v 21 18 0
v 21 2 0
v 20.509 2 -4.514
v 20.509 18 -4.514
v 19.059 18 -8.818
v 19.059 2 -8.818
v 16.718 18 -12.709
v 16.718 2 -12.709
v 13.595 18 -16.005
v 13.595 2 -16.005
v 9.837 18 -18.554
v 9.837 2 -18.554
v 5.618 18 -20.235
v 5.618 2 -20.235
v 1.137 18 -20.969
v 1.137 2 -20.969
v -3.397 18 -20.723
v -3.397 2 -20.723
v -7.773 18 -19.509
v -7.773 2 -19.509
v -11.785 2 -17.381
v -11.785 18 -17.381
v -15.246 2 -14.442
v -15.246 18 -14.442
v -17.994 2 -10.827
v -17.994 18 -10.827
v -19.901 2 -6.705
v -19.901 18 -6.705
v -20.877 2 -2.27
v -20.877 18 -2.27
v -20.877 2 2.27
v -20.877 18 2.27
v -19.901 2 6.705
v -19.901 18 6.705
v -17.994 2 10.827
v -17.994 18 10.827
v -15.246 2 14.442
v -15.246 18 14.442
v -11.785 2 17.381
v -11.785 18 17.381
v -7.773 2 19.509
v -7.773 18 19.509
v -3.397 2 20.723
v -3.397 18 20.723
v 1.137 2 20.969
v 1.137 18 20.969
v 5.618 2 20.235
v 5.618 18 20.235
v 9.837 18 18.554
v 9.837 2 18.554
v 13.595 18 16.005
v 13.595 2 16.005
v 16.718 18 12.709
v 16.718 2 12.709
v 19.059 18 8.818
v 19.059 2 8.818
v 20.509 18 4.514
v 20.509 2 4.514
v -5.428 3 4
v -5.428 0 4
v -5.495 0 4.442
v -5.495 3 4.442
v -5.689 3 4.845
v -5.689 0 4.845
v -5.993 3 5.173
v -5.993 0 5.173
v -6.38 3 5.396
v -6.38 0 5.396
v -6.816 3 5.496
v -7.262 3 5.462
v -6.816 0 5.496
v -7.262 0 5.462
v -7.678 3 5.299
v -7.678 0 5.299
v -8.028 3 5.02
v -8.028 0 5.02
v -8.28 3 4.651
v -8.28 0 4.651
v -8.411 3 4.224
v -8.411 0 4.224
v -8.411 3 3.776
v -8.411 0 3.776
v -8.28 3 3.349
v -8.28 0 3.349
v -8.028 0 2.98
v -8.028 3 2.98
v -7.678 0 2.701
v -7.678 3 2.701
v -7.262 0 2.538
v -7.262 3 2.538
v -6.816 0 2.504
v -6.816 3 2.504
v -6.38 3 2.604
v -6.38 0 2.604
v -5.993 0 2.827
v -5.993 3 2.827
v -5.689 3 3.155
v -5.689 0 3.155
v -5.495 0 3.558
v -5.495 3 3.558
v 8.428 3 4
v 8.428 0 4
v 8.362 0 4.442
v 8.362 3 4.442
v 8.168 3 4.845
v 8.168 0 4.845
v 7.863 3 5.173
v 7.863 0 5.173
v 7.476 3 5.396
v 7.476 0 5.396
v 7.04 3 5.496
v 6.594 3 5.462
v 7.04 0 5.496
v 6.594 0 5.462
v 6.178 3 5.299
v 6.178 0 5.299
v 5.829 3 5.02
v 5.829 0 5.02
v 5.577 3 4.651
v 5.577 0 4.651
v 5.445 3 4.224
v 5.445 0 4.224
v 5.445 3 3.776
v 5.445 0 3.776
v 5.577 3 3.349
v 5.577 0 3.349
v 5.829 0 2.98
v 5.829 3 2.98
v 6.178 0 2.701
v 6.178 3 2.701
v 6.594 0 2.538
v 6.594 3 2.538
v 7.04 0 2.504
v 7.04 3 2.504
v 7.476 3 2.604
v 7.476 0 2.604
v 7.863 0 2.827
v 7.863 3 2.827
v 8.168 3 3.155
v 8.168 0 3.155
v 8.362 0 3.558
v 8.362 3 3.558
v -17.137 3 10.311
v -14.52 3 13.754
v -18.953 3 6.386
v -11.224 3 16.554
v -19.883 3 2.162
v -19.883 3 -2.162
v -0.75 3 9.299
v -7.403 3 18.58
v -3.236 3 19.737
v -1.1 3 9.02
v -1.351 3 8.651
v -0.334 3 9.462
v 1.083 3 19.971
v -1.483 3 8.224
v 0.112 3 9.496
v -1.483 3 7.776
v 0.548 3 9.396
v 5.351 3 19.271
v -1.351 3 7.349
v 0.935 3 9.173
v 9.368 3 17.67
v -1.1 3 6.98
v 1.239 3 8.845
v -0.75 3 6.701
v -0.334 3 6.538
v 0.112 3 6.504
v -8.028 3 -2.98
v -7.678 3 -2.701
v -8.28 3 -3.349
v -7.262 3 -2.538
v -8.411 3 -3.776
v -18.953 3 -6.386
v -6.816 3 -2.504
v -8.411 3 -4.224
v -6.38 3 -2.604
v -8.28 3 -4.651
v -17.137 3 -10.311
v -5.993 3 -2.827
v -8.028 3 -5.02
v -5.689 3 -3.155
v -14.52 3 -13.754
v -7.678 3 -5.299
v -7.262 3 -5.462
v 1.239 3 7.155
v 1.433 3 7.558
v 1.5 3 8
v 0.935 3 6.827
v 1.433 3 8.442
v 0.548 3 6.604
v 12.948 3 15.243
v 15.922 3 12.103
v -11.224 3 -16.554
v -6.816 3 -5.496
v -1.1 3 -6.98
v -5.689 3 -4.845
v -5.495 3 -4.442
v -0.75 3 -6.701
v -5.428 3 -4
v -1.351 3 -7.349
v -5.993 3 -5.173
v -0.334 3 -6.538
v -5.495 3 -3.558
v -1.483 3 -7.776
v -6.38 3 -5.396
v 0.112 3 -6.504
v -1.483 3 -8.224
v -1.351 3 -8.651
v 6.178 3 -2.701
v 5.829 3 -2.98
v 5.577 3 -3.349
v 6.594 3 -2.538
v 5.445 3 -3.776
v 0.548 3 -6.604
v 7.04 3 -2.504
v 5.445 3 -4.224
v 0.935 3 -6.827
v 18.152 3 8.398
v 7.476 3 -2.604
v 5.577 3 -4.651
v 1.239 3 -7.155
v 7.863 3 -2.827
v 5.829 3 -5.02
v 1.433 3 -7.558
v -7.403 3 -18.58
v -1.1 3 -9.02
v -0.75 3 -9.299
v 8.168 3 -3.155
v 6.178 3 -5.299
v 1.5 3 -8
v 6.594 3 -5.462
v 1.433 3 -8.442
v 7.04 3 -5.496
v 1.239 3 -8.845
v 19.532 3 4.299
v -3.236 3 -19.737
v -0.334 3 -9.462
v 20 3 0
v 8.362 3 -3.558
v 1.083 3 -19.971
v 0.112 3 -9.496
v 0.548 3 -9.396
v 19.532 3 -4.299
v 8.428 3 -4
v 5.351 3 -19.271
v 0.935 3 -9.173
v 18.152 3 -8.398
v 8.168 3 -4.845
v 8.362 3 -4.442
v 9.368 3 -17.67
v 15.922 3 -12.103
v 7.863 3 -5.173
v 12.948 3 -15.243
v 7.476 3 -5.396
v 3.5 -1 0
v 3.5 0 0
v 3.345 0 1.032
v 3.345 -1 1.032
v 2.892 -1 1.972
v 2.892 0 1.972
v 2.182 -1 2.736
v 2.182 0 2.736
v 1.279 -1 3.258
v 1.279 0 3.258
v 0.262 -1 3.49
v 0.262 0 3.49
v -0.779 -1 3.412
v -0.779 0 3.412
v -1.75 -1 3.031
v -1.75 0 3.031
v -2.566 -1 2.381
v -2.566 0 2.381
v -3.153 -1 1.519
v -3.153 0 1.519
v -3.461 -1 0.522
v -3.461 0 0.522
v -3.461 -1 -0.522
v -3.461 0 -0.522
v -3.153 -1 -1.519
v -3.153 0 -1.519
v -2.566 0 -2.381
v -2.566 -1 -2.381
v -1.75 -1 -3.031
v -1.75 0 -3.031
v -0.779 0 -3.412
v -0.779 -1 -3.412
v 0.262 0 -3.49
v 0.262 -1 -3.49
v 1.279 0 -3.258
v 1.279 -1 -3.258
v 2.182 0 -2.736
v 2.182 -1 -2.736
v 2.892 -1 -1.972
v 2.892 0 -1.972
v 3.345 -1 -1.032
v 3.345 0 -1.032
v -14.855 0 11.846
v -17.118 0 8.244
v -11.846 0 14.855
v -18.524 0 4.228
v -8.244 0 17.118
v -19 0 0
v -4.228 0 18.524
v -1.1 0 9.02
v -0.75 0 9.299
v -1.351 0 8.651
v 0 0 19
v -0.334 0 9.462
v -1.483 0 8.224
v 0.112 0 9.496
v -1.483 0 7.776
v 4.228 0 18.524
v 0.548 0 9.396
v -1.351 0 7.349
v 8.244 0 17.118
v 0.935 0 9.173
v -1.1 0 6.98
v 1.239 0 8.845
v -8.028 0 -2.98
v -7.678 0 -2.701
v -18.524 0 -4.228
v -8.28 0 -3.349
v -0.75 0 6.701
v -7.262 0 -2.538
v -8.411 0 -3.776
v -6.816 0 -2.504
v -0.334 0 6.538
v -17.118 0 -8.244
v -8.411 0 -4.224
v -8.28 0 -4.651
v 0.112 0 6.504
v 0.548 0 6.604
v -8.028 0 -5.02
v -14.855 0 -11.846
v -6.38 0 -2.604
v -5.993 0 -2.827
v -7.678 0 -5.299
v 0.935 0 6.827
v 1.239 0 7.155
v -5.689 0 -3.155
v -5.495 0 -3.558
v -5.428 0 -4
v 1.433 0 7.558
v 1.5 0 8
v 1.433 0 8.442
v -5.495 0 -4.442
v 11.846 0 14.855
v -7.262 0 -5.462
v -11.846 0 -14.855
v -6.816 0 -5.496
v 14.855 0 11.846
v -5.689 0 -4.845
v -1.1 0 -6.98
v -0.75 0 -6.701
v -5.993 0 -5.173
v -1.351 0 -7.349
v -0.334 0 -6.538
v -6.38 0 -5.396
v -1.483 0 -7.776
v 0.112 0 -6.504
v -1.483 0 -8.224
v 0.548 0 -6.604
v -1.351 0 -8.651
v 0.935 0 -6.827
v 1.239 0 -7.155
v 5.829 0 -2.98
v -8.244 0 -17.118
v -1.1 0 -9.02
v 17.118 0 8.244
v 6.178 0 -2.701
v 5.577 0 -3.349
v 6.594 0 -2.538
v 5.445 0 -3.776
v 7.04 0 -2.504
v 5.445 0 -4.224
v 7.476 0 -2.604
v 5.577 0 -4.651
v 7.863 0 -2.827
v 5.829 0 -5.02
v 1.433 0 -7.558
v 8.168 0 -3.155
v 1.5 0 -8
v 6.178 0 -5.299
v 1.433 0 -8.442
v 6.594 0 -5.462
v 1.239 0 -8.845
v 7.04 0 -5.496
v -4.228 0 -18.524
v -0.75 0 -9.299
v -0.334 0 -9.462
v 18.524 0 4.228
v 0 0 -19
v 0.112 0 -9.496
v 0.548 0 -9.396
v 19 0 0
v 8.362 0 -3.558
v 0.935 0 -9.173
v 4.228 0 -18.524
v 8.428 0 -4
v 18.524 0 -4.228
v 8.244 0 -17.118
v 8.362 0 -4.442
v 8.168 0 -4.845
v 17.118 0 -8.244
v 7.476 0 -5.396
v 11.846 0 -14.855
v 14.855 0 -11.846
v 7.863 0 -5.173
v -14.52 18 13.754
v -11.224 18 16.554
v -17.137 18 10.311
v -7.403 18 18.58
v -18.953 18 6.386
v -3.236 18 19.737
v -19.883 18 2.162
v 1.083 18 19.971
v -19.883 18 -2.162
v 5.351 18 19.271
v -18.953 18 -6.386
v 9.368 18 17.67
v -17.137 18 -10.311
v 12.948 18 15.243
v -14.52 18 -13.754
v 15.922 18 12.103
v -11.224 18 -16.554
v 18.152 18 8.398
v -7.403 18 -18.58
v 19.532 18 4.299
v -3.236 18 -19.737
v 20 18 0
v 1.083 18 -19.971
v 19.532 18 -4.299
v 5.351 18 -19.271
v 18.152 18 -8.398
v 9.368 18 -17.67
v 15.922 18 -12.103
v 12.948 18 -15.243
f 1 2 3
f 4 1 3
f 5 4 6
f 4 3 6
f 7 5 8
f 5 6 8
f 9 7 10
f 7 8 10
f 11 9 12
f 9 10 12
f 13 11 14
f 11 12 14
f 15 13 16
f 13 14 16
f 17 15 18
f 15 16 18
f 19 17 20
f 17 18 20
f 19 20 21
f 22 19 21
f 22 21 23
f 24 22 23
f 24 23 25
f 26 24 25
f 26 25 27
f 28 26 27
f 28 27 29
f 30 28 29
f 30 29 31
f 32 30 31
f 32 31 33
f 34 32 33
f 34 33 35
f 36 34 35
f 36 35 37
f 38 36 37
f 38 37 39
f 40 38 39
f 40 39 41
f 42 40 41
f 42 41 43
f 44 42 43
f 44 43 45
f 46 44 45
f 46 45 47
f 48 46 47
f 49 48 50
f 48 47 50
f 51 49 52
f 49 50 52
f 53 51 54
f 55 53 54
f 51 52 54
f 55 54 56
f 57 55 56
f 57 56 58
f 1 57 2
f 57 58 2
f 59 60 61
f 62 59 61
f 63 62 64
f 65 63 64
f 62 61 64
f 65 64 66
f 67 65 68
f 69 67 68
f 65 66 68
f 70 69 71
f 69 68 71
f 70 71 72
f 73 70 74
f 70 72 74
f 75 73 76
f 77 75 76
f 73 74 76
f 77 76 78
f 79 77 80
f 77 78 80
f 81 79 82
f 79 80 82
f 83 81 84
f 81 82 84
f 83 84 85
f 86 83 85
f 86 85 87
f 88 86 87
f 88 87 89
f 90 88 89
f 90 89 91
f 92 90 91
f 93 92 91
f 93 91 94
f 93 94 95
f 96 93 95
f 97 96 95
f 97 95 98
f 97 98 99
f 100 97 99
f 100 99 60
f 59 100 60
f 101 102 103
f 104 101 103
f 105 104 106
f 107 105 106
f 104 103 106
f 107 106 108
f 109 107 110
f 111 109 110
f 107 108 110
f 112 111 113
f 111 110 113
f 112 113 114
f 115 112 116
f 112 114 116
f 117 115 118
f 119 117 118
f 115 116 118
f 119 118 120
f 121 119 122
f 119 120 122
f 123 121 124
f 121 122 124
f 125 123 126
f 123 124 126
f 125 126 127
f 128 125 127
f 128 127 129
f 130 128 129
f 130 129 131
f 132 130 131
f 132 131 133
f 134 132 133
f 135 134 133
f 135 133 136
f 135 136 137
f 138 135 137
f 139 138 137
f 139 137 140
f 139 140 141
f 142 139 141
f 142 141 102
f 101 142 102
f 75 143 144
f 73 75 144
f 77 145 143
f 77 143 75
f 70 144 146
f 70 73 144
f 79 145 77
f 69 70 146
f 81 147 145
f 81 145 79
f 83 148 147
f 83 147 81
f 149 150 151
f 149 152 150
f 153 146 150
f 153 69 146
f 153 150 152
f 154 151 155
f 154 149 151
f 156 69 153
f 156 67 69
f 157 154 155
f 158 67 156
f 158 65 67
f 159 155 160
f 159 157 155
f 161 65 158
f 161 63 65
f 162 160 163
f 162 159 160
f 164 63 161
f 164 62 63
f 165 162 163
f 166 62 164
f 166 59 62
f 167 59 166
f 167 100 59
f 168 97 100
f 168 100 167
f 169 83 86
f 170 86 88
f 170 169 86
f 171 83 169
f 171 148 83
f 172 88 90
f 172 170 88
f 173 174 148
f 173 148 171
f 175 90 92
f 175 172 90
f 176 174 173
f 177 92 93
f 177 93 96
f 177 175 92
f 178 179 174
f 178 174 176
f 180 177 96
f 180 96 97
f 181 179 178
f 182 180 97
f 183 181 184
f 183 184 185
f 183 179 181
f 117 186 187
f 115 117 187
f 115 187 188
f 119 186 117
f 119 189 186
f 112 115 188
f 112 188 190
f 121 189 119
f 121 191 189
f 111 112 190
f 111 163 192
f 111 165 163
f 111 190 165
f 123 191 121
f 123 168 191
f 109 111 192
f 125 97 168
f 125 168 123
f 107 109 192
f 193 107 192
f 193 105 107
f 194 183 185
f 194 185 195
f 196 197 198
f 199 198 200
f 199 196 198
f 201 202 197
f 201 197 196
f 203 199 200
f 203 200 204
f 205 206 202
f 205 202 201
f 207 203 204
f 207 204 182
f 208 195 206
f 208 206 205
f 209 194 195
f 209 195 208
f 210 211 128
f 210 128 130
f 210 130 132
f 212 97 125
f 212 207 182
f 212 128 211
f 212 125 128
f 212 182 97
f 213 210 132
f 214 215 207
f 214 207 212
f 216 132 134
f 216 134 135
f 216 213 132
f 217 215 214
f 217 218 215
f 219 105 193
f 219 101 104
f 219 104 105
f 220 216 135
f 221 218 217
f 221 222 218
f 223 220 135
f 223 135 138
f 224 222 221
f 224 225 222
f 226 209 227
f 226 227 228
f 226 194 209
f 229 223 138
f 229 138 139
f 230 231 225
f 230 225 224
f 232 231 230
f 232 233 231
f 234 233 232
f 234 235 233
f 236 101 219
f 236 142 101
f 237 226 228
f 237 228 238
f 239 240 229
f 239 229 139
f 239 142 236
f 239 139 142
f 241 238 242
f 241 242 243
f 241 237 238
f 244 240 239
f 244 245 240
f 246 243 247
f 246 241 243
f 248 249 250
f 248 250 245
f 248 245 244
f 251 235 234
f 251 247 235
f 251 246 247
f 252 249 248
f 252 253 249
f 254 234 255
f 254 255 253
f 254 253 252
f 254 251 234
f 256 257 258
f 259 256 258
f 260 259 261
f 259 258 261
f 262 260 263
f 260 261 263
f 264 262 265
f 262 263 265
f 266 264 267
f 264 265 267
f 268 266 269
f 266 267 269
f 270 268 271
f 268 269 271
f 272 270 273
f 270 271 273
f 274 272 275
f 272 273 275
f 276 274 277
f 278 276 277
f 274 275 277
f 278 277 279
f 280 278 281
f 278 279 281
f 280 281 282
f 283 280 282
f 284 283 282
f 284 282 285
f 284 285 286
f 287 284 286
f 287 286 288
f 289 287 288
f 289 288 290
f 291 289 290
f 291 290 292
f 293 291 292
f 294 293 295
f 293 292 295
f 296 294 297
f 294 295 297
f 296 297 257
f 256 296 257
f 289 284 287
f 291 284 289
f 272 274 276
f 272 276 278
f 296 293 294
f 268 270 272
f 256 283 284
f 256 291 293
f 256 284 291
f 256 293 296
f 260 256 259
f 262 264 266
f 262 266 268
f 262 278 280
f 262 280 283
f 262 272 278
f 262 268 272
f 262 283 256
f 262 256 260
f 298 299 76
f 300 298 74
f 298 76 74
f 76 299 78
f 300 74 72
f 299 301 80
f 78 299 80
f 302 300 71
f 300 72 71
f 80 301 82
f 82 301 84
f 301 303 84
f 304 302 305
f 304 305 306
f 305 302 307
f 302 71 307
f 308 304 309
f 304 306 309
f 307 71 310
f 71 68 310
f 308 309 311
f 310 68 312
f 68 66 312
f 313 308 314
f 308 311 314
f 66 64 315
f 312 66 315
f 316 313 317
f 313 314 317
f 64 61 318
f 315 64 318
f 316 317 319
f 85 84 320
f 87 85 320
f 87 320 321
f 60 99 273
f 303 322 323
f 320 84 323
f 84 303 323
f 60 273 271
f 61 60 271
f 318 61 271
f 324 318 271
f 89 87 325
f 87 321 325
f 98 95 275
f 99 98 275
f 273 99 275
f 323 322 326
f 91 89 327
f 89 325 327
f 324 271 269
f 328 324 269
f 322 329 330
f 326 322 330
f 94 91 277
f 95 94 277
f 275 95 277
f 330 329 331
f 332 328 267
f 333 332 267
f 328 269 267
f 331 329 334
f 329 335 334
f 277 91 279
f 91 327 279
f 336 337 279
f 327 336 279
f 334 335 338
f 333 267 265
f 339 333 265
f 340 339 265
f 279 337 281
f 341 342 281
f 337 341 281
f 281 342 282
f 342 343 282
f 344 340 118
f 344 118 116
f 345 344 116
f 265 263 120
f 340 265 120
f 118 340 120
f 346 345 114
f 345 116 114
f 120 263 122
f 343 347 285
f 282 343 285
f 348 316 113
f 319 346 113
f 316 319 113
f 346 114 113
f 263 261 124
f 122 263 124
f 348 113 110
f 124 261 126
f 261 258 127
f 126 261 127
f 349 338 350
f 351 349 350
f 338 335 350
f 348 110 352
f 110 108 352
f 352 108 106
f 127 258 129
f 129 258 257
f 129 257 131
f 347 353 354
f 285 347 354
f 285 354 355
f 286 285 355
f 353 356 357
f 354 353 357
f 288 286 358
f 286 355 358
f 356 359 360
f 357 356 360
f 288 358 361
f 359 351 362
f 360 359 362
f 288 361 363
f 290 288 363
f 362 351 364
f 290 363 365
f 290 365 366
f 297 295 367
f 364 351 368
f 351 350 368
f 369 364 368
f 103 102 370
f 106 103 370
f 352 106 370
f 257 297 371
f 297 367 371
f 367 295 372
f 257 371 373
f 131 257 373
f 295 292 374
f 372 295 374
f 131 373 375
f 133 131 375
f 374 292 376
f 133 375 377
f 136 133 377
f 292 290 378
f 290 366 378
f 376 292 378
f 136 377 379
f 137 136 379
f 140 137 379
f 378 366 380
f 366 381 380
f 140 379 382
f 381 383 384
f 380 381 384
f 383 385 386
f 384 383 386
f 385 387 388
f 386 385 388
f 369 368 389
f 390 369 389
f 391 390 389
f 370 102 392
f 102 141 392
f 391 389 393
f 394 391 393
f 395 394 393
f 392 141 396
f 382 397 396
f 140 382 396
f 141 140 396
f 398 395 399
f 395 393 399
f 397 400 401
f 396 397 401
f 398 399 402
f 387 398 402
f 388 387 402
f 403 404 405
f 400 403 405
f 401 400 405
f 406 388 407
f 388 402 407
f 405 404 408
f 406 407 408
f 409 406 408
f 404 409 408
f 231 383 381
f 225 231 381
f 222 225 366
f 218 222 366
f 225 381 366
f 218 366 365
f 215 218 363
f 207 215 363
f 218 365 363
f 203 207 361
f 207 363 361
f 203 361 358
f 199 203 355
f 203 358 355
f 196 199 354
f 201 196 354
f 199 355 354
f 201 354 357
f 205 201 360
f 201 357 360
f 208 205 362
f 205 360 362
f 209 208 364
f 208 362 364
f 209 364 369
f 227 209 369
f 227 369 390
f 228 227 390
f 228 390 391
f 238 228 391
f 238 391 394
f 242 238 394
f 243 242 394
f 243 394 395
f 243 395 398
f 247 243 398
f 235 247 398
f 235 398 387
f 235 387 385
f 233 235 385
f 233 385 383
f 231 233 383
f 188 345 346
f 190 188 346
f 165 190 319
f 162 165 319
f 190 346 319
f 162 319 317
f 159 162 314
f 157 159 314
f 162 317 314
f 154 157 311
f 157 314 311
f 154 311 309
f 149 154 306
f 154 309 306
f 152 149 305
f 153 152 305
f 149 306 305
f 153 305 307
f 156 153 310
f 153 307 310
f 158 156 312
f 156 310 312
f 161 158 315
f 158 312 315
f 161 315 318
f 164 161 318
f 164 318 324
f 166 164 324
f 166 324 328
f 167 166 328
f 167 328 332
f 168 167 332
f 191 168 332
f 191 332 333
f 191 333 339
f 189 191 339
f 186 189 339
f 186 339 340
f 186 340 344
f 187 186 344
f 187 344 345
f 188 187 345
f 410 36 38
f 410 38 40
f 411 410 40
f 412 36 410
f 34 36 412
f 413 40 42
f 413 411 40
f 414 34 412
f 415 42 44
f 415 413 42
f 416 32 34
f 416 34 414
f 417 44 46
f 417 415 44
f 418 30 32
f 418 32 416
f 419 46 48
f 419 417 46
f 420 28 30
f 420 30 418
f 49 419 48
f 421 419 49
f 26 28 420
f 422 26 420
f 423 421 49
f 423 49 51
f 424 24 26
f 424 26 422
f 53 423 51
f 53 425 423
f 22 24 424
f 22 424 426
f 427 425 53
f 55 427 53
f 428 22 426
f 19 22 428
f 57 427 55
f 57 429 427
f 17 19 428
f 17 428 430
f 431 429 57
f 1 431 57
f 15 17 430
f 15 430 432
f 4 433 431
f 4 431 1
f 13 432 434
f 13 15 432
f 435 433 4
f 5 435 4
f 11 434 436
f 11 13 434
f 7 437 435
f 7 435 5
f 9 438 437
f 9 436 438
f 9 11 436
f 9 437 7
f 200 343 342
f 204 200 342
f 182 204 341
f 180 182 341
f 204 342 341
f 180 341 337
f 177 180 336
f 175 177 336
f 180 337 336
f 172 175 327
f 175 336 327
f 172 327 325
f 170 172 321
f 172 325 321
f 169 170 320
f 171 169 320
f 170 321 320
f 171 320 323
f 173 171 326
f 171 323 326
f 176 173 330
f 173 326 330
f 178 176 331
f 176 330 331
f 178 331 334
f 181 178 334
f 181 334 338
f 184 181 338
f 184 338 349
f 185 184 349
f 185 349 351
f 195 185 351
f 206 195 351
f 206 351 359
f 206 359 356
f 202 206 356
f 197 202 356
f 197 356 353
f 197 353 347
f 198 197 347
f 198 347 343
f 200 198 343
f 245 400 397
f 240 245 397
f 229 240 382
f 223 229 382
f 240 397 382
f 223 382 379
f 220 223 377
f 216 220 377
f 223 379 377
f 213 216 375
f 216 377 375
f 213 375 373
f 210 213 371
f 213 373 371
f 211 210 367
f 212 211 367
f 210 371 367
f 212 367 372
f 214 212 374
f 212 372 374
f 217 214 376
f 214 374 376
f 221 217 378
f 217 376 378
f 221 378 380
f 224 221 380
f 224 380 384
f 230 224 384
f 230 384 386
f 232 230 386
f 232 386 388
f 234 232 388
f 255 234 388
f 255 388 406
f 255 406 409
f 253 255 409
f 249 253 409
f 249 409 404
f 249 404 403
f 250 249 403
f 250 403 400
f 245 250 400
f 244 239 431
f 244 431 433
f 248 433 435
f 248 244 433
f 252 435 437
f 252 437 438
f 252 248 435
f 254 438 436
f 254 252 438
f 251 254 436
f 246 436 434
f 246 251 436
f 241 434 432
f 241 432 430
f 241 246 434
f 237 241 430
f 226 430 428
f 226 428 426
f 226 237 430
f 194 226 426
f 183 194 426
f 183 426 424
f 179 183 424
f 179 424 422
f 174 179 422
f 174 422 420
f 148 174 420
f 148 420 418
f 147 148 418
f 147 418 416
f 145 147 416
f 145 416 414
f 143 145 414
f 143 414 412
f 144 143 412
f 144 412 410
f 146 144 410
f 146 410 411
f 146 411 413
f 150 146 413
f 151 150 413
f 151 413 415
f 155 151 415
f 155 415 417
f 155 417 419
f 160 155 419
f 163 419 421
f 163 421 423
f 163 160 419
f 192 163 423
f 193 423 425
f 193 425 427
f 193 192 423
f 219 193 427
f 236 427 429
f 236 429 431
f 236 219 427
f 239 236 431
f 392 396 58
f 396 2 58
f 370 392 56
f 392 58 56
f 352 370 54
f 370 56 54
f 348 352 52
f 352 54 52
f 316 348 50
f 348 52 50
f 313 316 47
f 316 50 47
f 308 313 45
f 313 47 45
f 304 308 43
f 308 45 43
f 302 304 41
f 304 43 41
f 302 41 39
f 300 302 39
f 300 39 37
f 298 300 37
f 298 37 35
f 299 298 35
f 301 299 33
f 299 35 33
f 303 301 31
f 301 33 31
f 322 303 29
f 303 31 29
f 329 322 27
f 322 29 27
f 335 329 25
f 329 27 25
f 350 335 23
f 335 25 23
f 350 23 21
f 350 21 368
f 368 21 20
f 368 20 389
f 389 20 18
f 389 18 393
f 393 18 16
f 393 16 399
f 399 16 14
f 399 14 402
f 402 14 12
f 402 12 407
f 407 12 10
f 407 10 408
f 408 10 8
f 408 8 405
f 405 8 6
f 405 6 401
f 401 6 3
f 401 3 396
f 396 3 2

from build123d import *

# Parameters (mm, degrees)
SKETCH_1_R          = 20
EXTRUDE_1_DEPTH     = 3
SKETCH_1_3_R        = 21
SKETCH_1_3_R_2      = 20
EXTRUDE_2_DEPTH     = 18
SKETCH_4_R          = 1.5
CUT_EXTRUDE_1_DEPTH = 17
SKETCH_5_R          = 3.5
EXTRUDE_3_DEPTH     = 1


with BuildPart() as part:
    # Sketch 1 → Extrude 1 (new body)
    with BuildSketch(Plane(origin=(0, 0, 0), x_dir=(1, 0, 0), z_dir=(0, 1, 0))):
        Circle(SKETCH_1_R)
    extrude(amount=EXTRUDE_1_DEPTH)

    # Sketch 1_3 → Extrude 2 (add)
    with BuildSketch(Plane(origin=(0, 0, 0), x_dir=(1, 0, 0), z_dir=(0, 1, 0))):
        Circle(SKETCH_1_3_R)
        Circle(SKETCH_1_3_R_2, mode=Mode.SUBTRACT)
    extrude(amount=EXTRUDE_2_DEPTH)

    # Sketch 3 → Cut-Revolve 1 (revolve, cut)
    with BuildSketch(Plane.XY):
        Polygon((19, 0), (21, 2), (21, 0), align=None)
    revolve(axis=Axis((0, 18, 0), (0, -1, 0)), mode=Mode.SUBTRACT)

    # Sketch 4 → Cut-Extrude 1 (cut)
    with BuildSketch(Plane.XZ):
        with Locations((0, 8)):
            Circle(SKETCH_4_R)
        with Locations((6.92820323, 4)):
            Circle(SKETCH_4_R)
        with Locations((6.92820323, -4)):
            Circle(SKETCH_4_R)
        with Locations((0, -8)):
            Circle(SKETCH_4_R)
        with Locations((-6.92820323, -4)):
            Circle(SKETCH_4_R)
        with Locations((-6.92820323, 4)):
            Circle(SKETCH_4_R)
    extrude(amount=-CUT_EXTRUDE_1_DEPTH, mode=Mode.SUBTRACT)

    # Sketch 5 → Extrude 3 (add)
    with BuildSketch(Plane.XZ):
        Circle(SKETCH_5_R)
    extrude(amount=EXTRUDE_3_DEPTH)


solid = part.part
